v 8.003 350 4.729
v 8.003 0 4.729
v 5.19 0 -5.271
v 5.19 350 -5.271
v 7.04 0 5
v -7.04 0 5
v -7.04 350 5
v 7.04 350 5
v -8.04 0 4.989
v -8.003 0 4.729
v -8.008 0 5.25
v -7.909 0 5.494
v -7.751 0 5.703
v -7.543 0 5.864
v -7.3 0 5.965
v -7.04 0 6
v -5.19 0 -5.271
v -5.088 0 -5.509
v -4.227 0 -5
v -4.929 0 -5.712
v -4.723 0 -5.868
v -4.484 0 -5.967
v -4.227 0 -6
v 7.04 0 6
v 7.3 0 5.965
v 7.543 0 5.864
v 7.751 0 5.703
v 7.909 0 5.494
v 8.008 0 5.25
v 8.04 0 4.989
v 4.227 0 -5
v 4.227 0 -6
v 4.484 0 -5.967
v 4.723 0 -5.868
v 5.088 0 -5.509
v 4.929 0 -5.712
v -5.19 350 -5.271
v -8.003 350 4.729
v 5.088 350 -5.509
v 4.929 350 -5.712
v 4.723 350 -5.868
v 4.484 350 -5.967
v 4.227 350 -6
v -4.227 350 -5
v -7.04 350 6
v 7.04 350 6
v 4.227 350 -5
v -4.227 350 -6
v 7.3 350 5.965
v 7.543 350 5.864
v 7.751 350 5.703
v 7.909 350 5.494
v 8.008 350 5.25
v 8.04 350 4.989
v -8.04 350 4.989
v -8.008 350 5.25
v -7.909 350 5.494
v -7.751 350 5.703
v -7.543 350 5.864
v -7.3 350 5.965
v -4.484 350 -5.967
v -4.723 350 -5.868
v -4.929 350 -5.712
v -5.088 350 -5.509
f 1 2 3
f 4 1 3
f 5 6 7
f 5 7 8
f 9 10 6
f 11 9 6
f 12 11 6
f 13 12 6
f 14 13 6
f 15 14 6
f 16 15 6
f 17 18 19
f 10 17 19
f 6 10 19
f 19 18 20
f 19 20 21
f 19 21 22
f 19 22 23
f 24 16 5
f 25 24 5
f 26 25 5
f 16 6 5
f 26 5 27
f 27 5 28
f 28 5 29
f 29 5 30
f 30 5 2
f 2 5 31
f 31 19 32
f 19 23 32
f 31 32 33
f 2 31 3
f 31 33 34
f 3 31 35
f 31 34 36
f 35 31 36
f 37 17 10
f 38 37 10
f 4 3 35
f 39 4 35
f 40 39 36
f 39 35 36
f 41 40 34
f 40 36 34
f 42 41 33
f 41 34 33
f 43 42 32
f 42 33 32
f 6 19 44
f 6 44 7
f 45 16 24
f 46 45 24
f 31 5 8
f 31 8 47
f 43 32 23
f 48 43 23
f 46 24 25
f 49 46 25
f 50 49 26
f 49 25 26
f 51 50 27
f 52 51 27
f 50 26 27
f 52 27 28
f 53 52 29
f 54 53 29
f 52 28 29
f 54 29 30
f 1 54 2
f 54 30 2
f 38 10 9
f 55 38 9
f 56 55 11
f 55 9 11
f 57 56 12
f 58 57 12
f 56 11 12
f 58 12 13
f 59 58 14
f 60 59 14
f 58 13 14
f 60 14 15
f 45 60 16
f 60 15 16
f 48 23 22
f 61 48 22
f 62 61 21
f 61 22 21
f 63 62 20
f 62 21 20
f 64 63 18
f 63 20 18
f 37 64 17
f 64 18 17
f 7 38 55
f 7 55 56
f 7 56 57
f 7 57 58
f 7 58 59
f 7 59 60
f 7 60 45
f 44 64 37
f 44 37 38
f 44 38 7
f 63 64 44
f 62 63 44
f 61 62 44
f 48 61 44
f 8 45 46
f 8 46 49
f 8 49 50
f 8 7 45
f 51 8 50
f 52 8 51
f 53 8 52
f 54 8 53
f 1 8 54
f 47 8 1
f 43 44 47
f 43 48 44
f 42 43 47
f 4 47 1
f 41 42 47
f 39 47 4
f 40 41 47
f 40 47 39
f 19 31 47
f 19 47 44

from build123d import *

# Parameters (mm, degrees)
BOSS_EXTRUDE1_DEPTH = 350


with BuildPart() as part:
    # Sketch1 → Boss-Extrude1 (new body)
    with BuildSketch(Plane(origin=(0, 0, 0), x_dir=(1, 0, 0), z_dir=(0, 1, 0))):
        with BuildLine():
            Line((-7.039855599, -6), (7.039855599, -6))
            ThreePointArc((7.039855599, -6), (7.836958346, -5.603843698), (8.002506539, -4.729254423))
            Line((8.002506539, -4.729254423), (5.190006539, 5.270745577))
            ThreePointArc((5.190006539, 5.270745577), (4.831199297, 5.797102746), (4.227355599, 6))
            Line((4.227355599, 6), (-4.227355599, 6))
            ThreePointArc((-4.227355599, 6), (-4.831199297, 5.797102746), (-5.190006539, 5.270745577))
            Line((-5.190006539, 5.270745577), (-8.002506539, -4.729254423))
            ThreePointArc((-8.002506539, -4.729254423), (-7.836958346, -5.603843698), (-7.039855599, -6))
        make_face()
        Polygon((-7.039855599, -5), (7.039855599, -5), (4.227355599, 5), (-4.227355599, 5), align=None, mode=Mode.SUBTRACT)
    extrude(amount=BOSS_EXTRUDE1_DEPTH)


solid = part.part
